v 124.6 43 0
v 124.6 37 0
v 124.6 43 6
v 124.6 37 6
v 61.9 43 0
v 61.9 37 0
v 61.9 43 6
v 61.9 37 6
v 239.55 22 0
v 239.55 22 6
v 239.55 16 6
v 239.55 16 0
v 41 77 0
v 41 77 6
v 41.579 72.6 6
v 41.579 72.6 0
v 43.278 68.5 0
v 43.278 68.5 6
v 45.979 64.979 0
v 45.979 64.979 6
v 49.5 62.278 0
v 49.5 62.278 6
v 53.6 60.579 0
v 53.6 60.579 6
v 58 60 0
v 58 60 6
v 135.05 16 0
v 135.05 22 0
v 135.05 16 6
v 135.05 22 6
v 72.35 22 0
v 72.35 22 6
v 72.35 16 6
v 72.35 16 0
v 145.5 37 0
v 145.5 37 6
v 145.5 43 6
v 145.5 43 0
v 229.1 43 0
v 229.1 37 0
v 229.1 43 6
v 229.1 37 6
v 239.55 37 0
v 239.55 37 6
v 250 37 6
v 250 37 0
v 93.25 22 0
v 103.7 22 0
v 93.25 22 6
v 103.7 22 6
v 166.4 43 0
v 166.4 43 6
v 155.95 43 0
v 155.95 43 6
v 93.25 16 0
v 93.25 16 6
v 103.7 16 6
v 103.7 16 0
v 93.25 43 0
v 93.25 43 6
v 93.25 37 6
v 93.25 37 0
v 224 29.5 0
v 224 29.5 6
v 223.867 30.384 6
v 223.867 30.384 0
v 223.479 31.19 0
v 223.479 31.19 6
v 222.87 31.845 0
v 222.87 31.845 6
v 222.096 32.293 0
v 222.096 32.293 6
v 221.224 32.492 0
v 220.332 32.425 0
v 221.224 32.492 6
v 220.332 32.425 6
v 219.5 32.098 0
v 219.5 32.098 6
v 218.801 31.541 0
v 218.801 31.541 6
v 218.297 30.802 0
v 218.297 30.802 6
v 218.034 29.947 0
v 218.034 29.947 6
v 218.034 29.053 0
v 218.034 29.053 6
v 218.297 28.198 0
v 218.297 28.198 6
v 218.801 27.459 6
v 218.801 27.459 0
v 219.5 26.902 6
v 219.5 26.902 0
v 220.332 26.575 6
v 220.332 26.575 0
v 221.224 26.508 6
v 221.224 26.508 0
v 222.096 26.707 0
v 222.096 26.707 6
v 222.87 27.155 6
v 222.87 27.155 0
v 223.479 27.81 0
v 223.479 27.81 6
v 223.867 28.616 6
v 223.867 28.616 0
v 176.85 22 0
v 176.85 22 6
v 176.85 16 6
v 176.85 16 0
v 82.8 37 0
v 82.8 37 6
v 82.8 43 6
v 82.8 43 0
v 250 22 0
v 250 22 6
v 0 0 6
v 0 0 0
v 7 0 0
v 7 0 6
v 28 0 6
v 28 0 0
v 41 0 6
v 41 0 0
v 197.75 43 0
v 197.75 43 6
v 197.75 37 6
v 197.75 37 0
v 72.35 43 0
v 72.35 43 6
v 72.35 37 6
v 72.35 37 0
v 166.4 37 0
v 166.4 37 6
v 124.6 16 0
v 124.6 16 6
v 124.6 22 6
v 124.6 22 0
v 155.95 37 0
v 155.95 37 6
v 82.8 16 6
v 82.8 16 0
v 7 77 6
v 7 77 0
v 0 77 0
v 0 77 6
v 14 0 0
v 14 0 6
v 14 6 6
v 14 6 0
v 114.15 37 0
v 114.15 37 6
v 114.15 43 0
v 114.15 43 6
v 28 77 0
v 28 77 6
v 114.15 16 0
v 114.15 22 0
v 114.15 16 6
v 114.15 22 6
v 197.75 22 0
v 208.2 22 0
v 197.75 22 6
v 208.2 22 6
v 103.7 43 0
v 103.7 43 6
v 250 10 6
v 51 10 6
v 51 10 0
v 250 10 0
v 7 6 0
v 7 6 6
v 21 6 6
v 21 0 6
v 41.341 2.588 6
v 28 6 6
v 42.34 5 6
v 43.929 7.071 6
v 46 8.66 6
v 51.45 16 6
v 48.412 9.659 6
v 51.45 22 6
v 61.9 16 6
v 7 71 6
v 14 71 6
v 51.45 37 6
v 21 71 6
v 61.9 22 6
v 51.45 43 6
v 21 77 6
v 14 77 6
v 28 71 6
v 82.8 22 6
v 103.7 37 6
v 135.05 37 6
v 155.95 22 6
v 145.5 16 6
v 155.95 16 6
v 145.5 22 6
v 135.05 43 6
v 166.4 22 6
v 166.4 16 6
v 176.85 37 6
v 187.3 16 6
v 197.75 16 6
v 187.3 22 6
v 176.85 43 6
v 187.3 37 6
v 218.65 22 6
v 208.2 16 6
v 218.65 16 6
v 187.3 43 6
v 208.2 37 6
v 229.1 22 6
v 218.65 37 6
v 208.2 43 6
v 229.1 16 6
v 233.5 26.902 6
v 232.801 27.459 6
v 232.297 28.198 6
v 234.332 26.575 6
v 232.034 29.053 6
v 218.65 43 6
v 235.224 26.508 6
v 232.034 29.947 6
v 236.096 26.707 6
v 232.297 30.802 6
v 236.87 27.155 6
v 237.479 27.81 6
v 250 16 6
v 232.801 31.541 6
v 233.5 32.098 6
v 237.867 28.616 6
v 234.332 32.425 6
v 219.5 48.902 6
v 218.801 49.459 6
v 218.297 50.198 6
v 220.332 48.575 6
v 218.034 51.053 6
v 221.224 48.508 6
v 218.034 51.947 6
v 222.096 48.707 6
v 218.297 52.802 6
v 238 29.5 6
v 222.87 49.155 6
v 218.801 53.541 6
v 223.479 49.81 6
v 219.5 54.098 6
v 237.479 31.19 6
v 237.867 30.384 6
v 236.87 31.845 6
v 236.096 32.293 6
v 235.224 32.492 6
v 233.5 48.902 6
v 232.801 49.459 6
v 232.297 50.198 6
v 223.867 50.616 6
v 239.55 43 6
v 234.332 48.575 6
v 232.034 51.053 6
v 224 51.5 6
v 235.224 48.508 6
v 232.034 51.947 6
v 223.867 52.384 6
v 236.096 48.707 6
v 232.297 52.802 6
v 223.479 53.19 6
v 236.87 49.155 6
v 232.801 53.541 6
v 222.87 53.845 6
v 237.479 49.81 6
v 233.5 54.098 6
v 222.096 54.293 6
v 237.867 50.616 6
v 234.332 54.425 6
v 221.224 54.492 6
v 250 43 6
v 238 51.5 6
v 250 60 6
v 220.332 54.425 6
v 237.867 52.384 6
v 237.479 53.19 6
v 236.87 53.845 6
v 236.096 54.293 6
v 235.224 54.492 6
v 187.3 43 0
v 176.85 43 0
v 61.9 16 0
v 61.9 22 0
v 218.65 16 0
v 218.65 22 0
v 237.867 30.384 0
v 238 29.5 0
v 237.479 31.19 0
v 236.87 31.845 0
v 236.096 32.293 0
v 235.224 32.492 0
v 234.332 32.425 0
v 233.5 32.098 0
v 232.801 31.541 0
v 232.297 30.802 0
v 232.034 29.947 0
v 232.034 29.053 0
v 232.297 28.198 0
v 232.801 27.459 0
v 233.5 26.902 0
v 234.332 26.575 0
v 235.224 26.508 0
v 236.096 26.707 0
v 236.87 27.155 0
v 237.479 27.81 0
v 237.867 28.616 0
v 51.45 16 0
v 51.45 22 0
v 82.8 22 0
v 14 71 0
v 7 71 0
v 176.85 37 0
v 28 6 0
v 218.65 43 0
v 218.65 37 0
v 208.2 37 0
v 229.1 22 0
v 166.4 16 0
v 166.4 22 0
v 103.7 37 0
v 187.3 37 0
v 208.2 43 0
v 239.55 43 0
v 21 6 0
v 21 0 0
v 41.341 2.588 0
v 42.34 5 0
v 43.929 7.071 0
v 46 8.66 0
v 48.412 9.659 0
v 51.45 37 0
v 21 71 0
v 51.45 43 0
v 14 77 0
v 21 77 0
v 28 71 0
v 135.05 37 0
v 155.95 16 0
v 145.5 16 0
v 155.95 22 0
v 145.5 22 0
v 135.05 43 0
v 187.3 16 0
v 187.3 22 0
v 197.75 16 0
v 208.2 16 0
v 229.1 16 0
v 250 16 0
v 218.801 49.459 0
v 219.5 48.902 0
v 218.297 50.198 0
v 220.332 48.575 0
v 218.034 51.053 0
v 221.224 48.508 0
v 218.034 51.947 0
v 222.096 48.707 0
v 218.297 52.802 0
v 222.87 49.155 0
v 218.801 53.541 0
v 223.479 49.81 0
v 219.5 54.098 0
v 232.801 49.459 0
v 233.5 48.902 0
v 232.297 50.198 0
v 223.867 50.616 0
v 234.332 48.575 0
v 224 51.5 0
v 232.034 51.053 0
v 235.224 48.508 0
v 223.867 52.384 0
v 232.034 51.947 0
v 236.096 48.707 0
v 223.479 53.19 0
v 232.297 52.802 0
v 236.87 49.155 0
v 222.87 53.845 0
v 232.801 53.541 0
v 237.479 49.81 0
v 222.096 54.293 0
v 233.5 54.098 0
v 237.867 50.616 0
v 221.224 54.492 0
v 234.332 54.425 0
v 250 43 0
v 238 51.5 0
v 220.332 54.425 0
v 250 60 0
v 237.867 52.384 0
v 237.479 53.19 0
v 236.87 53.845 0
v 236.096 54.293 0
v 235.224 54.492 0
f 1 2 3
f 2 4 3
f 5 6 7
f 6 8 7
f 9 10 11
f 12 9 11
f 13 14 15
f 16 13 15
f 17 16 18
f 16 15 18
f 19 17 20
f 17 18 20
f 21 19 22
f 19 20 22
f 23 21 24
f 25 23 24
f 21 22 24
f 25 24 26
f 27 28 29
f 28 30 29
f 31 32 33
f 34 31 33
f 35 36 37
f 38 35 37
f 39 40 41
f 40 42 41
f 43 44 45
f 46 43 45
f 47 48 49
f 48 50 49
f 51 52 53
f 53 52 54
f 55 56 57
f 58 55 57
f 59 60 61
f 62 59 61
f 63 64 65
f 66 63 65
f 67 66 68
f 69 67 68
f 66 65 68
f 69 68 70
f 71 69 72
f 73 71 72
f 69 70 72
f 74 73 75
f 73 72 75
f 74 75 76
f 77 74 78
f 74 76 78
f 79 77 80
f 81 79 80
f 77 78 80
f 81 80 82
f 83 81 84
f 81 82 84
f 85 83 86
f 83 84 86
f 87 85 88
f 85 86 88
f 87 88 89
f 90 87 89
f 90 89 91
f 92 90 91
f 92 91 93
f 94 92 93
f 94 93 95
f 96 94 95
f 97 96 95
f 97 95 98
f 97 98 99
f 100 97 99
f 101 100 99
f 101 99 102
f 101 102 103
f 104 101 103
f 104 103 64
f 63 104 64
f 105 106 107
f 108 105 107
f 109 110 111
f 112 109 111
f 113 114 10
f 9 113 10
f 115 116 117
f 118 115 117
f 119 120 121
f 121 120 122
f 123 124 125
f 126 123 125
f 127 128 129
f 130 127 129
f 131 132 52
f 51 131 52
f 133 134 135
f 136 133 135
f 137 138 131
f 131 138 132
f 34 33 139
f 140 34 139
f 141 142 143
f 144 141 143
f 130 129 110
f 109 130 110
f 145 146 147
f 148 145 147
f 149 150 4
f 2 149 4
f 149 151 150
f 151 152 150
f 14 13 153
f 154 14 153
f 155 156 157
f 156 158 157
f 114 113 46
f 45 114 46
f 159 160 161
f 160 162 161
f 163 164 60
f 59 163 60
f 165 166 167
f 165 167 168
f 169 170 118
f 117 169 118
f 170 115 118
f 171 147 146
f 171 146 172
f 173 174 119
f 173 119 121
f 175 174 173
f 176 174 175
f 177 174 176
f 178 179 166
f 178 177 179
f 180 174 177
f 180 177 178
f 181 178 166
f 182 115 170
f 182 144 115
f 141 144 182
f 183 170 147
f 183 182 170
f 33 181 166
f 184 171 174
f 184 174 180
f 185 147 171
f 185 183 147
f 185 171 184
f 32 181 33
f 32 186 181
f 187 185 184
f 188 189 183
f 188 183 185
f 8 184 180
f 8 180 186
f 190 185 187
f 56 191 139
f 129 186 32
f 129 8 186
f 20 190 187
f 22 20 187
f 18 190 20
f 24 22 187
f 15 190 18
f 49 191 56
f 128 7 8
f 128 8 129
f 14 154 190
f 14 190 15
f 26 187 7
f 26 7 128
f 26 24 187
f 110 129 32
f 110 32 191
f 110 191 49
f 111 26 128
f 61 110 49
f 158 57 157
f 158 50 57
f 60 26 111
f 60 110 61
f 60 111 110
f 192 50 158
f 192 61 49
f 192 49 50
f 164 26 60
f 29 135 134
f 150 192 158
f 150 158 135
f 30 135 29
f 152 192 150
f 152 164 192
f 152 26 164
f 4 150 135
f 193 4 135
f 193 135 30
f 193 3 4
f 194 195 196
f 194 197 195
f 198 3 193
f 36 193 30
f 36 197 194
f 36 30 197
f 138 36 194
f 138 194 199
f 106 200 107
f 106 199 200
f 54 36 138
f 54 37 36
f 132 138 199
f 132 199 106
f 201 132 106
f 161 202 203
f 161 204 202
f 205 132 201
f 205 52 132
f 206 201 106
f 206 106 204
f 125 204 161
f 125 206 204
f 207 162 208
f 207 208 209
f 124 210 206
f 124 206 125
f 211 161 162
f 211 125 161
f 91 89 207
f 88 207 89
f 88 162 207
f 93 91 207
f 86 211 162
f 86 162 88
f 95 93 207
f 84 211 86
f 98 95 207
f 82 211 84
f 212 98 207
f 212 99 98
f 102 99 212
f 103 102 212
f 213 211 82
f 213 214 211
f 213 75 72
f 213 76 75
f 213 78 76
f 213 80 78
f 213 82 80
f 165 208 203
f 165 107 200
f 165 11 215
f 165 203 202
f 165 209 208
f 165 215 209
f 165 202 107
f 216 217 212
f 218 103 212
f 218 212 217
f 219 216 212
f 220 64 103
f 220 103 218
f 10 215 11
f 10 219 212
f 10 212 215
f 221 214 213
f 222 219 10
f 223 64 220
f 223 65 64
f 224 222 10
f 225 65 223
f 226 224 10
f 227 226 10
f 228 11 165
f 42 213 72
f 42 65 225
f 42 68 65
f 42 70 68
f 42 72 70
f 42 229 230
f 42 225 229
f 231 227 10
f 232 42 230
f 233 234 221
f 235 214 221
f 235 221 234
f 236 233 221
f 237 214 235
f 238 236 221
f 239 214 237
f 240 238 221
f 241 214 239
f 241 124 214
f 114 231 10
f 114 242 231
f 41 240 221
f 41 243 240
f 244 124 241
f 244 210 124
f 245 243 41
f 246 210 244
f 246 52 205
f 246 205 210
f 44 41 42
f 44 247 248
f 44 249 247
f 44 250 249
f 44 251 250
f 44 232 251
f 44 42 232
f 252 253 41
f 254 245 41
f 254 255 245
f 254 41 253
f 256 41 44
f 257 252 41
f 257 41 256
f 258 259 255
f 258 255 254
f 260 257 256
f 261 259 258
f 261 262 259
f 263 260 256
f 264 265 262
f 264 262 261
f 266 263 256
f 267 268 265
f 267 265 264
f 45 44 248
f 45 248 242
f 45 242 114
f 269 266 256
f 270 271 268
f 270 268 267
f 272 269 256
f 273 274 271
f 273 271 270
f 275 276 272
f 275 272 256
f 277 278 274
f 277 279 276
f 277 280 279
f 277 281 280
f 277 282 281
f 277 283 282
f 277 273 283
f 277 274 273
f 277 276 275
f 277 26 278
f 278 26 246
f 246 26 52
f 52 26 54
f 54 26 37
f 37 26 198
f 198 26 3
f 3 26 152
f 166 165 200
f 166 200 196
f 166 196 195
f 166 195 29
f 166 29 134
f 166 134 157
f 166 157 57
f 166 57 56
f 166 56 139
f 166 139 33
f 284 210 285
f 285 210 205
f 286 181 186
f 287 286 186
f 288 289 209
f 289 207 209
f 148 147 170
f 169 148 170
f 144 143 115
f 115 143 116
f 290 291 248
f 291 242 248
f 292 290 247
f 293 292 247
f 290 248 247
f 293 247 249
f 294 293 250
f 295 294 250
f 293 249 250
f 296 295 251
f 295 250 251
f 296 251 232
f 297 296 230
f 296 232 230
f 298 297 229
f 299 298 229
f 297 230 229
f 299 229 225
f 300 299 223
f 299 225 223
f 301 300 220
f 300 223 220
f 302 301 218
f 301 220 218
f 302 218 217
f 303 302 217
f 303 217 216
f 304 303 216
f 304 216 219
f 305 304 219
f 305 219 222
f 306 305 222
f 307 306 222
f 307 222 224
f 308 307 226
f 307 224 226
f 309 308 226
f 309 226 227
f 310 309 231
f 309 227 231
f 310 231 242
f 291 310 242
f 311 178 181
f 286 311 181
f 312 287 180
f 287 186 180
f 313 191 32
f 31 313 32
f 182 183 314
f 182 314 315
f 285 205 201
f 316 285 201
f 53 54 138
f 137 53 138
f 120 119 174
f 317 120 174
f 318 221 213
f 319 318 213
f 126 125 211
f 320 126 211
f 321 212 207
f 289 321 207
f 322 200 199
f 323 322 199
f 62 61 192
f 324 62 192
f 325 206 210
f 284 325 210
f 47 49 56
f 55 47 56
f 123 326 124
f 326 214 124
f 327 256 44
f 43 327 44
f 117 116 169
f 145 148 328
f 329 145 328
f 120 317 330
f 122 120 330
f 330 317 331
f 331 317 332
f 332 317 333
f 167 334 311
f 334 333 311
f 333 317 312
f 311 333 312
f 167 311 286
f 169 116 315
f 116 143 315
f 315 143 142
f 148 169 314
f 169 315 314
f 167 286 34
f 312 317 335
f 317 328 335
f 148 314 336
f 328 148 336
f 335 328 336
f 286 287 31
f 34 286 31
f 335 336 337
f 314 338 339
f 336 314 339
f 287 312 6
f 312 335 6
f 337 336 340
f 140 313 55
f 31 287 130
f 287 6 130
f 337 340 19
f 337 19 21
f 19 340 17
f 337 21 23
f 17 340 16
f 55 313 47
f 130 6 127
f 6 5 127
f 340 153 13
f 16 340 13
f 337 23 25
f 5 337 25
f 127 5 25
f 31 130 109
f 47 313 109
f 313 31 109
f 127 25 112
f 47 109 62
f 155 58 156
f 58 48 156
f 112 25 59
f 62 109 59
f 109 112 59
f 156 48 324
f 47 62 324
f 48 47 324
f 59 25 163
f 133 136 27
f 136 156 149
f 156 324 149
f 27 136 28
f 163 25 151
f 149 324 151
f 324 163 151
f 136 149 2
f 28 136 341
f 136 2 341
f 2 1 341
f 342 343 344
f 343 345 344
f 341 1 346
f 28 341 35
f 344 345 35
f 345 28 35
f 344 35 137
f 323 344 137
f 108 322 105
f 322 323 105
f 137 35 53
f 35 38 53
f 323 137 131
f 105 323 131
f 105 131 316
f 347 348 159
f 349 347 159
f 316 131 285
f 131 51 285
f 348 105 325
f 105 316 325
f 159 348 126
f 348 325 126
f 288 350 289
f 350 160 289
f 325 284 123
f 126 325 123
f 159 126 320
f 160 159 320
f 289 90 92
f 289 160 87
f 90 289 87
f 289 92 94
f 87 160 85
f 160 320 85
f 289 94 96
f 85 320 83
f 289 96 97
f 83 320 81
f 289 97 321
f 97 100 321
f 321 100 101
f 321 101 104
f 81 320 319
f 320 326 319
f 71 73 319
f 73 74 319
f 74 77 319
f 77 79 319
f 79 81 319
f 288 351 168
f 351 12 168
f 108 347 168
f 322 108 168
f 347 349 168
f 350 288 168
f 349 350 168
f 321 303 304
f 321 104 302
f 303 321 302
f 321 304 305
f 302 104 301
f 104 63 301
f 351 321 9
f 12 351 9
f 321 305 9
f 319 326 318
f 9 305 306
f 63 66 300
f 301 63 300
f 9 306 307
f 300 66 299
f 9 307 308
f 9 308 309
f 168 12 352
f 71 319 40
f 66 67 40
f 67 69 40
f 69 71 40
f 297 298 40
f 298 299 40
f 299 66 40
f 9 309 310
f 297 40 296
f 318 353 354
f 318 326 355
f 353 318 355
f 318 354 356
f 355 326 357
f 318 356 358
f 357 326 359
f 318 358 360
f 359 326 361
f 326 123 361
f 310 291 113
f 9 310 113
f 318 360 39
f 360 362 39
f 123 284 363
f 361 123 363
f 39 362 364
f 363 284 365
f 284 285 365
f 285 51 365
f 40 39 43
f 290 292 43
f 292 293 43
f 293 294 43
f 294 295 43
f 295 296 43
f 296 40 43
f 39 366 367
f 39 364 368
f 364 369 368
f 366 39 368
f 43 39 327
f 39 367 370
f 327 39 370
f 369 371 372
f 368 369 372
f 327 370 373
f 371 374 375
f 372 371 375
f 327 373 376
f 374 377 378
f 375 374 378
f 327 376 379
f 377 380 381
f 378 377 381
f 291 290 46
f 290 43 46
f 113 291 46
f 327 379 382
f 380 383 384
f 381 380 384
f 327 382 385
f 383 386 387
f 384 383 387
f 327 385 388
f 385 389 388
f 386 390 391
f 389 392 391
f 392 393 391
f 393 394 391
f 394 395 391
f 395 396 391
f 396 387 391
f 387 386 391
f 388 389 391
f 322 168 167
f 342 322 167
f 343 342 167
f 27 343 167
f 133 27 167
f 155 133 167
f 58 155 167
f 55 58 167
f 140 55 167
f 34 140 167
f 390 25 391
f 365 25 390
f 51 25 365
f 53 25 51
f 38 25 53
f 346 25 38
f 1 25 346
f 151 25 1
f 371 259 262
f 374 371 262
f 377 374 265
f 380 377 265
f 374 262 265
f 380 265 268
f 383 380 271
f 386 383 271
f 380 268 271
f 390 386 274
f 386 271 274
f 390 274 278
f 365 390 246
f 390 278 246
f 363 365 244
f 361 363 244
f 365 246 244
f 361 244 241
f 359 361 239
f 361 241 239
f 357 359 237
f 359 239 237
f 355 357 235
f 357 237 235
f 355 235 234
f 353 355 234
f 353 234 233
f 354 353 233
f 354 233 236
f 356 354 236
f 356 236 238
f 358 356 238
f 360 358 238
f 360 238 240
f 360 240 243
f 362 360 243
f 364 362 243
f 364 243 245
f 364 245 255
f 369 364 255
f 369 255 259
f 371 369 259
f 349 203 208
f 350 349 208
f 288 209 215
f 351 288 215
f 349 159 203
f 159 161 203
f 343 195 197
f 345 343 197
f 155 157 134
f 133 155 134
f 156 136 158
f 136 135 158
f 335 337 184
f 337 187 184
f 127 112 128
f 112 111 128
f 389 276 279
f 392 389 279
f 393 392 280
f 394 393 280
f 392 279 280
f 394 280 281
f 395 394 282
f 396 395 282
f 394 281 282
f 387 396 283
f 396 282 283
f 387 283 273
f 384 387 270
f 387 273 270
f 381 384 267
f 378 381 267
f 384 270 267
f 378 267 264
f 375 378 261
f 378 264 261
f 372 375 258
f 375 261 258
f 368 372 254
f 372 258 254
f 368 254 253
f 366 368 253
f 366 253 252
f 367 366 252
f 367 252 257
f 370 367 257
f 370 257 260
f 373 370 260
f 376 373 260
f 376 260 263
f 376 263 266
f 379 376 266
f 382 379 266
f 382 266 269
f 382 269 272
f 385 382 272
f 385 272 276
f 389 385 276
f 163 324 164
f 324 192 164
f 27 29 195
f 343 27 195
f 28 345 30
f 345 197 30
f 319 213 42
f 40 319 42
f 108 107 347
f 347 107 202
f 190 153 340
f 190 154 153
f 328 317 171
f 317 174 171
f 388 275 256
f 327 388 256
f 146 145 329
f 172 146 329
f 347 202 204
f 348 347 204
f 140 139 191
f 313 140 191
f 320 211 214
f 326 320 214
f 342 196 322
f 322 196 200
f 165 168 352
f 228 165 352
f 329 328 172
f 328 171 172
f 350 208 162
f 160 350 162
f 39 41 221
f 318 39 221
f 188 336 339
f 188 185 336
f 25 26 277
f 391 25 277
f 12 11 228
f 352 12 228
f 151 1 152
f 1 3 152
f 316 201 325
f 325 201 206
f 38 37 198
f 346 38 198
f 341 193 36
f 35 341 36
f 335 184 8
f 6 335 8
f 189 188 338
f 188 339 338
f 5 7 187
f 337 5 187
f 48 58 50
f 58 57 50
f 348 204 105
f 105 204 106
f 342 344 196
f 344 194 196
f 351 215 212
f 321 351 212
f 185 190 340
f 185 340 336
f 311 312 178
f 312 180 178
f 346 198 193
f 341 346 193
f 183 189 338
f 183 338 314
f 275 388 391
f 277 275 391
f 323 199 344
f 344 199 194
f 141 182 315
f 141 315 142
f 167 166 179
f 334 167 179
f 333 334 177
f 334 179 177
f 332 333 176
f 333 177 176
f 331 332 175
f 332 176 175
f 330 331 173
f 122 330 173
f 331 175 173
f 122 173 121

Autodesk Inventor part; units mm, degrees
ref_plane "YZ Plane" through (0, 0, 0) normal (1, 0, 0) x (0, 1, 0)
ref_plane "XZ Plane" through (0, 0, 0) normal (0, 1, 0) x (-1, 0, 0)
ref_plane "XY Plane" through (0, 0, 0) normal (0, 0, 1) x (1, 0, 0)
sketch "Sketch1" plane through (0, 0, 0) normal (0, 0, 1) x (1, 0, 0)
  line L0 (0, 0) -> (250, 0)
  line L1 (250, 0) -> (250, 77)
  line L2 (250, 77) -> (0, 77)
  line L3 (0, 77) -> (0, 0)
  dimension "d0" = 250
  dimension "d1" = 77
extrude "Extrusion1" add sketch "Sketch1" along normal blind 6
sketch "Sketch2" plane through (0, 0, 6) normal (0, 0, 1) x (1, 0, 0)
  line L0 (250, 77) -> (0, 77) projected
  line L1 (0, 77) -> (7, 77)
  line L2 (7, 77) -> (14, 77)
  line L3 (14, 77) -> (14, 71)
  line L4 (14, 71) -> (7, 71)
  line L5 (7, 71) -> (7, 77)
  line L6 (0, 0) -> (250, 0) projected
  line L7 (0, 0) -> (7, 0)
  line L8 (7, 0) -> (14, 0)
  line L9 (14, 0) -> (14, 6)
  line L10 (14, 6) -> (7, 6)
  line L11 (7, 6) -> (7, 0)
  dimension "d4" = 7
  dimension "d5" = 7
  dimension "d6" = 6
  dimension "d7" = 7
  dimension "d8" = 7
  dimension "d9" = 6
extrude "Extrusion2" cut sketch "Sketch2" against normal blind 6
pattern_linear "Rectangular Pattern1" count 2 spacing 14 along (1, 0, 0) of "Extrusion2"
sketch "Sketch3" plane through (0, 0, 6) normal (0, 0, 1) x (1, 0, 0)
  line L0 (250, 77) -> (28, 77) projected
  line L1 (41, 77) -> (49.5, 77)
  line L2 (28, 0) -> (250, 0) projected
  line L3 (41, 0) -> (51, 0)
  arc A0 (51, 10) -> (41, 0) centre (51, 0) ccw
  line L4 (41, 77) -> (58, 77)
  arc A1 (41, 77) -> (58, 60) centre (58, 77) ccw
  line L5 (58, 60) -> (250, 60)
  line L6 (51, 10) -> (250, 10)
  line L7 (250, 0) -> (250, 77) projected
  point P0 (0, 0)
  point P1 (0, 77)
  dimension "d15" = 41
  dimension "d21" = 34
extrude "Extrusion3" cut sketch "Sketch3" against normal blind 6
sketch "Sketch4" plane through (0, 0, 6) normal (0, 0, 1) x (1, 0, 0)
  line L0 (28, 0) -> (41, 0) projected
  line L1 (51.45, 16) -> (61.9, 16)
  line L2 (61.9, 16) -> (61.9, 22)
  line L3 (61.9, 22) -> (51.45, 22)
  line L4 (51.45, 22) -> (51.45, 16)
  line L5 (51.45, 37) -> (61.9, 37)
  line L6 (61.9, 37) -> (61.9, 43)
  line L7 (61.9, 43) -> (51.45, 43)
  line L8 (51.45, 43) -> (51.45, 37)
  point P0 (0, 0)
  point P1 (51, 10)
  dimension "d26" = 10.45
  dimension "d27" = 6
  dimension "d28" = 15
  dimension "d29" = 10.45
  dimension "d30" = 6
extrude "Extrusion4" cut sketch "Sketch4" against normal blind 6
pattern_linear "Rectangular Pattern2" count 10 spacing 20.9 along (1, 0, 0) of "Extrusion4"
sketch "Sketch5" plane through (0, 0, 6) normal (0, 0, 1) x (1, 0, 0)
  line L0 (250, 43) -> (250, 60) projected
  circle A0 centre (235, 51.5) radius 3
  circle A1 centre (221, 51.5) radius 3
  line L1 (250, 22) -> (250, 37) projected
  circle A2 centre (221, 29.5) radius 3
  circle A3 centre (235, 29.5) radius 3
  point P0 (0, 0)
  dimension "d37" = 6
  dimension "d39" = 6
  dimension "d40" = 6
  dimension "d41" = 6
extrude "Extrusion5" cut sketch "Sketch5" against normal blind 6
properties part number "g_arm1"
